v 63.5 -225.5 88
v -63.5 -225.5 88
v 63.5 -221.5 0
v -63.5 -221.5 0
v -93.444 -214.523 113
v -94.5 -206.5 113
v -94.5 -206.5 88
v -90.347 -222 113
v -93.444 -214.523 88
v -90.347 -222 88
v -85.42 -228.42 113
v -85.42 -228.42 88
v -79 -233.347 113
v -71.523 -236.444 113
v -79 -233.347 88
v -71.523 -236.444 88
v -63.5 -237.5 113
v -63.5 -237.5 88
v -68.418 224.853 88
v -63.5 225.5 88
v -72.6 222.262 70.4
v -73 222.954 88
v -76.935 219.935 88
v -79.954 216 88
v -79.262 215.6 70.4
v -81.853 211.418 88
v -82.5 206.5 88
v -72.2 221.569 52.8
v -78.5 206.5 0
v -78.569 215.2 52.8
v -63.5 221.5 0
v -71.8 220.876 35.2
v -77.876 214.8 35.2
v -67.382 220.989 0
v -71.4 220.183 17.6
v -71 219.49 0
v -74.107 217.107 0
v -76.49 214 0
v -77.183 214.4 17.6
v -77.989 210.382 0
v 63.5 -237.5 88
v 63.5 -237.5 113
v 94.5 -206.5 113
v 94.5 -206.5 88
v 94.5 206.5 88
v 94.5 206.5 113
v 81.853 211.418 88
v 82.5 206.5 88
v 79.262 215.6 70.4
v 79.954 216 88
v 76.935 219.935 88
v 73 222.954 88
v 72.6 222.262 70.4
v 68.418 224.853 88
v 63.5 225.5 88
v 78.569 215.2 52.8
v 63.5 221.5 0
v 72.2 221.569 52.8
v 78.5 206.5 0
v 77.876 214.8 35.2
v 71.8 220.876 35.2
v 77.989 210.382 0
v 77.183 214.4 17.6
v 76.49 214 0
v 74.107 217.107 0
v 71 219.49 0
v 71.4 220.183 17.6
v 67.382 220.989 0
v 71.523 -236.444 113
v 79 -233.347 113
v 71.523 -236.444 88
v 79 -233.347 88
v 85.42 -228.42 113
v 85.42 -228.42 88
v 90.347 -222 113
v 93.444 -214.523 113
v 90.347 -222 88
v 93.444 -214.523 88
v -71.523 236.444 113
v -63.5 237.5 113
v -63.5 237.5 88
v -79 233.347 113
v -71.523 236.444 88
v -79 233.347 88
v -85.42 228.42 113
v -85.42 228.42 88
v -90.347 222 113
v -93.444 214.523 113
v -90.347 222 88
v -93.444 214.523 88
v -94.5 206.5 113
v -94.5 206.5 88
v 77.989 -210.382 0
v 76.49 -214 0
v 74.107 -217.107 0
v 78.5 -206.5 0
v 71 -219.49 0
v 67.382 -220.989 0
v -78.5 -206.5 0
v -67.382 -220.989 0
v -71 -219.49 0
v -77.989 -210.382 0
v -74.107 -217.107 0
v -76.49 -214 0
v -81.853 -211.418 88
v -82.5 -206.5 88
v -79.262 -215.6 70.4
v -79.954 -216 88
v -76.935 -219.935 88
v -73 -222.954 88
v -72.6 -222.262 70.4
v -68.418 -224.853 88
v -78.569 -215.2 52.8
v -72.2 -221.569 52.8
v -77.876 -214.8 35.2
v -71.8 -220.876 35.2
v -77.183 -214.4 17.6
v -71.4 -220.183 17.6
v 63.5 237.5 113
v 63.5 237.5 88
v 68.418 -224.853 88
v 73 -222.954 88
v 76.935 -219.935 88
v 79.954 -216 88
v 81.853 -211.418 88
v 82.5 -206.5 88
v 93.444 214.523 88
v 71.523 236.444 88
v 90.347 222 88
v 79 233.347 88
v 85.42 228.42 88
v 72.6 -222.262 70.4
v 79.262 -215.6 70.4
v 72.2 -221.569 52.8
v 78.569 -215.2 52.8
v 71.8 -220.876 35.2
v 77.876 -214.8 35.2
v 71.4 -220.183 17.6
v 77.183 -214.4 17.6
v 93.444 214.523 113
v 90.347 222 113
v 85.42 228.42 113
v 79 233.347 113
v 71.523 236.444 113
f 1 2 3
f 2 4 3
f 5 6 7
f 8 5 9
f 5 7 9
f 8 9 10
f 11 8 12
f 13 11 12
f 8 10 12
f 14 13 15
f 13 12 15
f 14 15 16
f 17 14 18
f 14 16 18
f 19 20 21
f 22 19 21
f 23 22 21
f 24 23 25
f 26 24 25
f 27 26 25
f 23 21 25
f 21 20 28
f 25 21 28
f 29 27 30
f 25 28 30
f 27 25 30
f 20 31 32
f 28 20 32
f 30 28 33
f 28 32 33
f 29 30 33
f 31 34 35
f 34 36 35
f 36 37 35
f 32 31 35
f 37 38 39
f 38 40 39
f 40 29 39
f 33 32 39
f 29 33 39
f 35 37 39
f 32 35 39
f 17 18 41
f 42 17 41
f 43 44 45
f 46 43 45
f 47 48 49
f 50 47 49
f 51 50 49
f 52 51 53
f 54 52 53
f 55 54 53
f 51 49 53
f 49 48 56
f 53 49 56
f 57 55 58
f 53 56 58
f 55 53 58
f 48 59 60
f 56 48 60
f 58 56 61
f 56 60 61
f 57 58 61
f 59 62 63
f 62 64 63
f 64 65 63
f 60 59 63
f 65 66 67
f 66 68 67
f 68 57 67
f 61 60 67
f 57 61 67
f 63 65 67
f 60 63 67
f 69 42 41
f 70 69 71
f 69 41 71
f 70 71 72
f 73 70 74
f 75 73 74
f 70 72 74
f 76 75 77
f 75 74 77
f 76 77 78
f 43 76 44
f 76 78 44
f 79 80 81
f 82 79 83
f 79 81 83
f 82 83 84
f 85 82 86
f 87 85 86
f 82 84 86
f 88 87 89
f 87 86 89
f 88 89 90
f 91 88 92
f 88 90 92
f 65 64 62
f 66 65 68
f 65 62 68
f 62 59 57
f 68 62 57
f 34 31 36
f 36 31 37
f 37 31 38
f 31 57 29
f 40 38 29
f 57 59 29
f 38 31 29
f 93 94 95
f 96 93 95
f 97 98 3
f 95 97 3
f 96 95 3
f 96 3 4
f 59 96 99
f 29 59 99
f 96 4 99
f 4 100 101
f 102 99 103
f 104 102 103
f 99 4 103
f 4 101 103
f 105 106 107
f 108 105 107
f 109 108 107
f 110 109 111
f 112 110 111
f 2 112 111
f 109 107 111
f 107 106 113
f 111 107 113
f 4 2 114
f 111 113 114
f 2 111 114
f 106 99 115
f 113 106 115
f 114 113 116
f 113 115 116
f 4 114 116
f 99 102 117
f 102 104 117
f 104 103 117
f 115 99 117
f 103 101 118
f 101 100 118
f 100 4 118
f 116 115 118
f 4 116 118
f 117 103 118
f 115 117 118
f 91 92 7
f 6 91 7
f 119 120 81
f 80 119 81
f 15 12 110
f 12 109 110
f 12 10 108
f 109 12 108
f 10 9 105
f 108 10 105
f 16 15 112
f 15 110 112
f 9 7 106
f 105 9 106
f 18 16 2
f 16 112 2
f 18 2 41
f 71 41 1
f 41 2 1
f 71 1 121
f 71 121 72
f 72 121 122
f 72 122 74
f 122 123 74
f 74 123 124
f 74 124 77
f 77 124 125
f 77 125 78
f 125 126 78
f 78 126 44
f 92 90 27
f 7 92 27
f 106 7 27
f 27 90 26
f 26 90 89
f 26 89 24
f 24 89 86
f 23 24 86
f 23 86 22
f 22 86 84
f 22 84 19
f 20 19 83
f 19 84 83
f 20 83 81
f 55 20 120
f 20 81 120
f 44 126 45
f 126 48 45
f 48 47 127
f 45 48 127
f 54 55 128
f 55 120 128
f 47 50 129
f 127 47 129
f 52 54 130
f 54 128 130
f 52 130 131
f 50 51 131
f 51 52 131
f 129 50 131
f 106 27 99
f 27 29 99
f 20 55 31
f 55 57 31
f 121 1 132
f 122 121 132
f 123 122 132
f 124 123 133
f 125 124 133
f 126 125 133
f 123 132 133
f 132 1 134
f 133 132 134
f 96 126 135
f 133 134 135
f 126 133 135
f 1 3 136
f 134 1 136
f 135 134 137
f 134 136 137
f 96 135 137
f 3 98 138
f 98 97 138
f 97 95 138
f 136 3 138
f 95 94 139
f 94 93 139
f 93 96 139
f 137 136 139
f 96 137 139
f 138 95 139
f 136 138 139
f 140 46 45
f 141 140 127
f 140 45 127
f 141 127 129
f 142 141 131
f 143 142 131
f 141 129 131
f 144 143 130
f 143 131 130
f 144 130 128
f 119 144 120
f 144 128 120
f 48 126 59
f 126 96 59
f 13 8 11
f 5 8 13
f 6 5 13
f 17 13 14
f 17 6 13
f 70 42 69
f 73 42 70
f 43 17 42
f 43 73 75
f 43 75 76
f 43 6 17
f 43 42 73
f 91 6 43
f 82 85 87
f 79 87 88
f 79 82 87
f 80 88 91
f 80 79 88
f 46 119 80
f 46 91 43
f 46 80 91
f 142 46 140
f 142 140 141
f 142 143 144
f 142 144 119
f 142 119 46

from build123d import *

# Parameters (mm, degrees)
F5_DEPTH = 25


with BuildPart() as f3:
    # F2 (on offset) → F3 section 0
    with BuildSketch(Plane.XY.offset(88)):
        with BuildLine():
            Line((-82.5, 206.5), (-82.5, -206.5))
            ThreePointArc((-82.5, -206.5), (-76.9350288425, -219.9350288425), (-63.5, -225.5))
            Line((-63.5, -225.5), (63.5, -225.5))
            ThreePointArc((63.5, -225.5), (76.9350288425, -219.9350288425), (82.5, -206.5))
            Line((82.5, -206.5), (82.5, 206.5))
            ThreePointArc((82.5, 206.5), (76.9350288425, 219.9350288425), (63.5, 225.5))
            Line((63.5, 225.5), (-63.5, 225.5))
            ThreePointArc((-63.5, 225.5), (-76.9350288425, 219.9350288425), (-82.5, 206.5))
        make_face()
    # F0 (on Top) → F3 section 1
    with BuildSketch(Plane.XY):
        with BuildLine():
            ThreePointArc((78.5, 206.5), (74.1066017178, 217.1066017178), (63.5, 221.5))
            Line((63.5, 221.5), (-63.5, 221.5))
            ThreePointArc((-63.5, 221.5), (-74.1066017178, 217.1066017178), (-78.5, 206.5))
            Line((-78.5, 206.5), (-78.5, -206.5))
            ThreePointArc((-78.5, -206.5), (-74.1066017178, -217.1066017178), (-63.5, -221.5))
            Line((-63.5, -221.5), (63.5, -221.5))
            ThreePointArc((63.5, -221.5), (74.1066017178, -217.1066017178), (78.5, -206.5))
            Line((78.5, -206.5), (78.5, 206.5))
        make_face()
    loft()

    # F4 (on face) → F5 (join)
    with BuildSketch(Plane.XY.offset(88)):
        with BuildLine():
            Line((63.5, 237.5), (-63.5, 237.5))
            ThreePointArc((-63.5, 237.5), (-85.4203102168, 228.4203102168), (-94.5, 206.5))
            Line((-94.5, 206.5), (-94.5, -206.5))
            ThreePointArc((-94.5, -206.5), (-85.4203102168, -228.4203102168), (-63.5, -237.5))
            Line((-63.5, -237.5), (63.5, -237.5))
            ThreePointArc((63.5, -237.5), (85.4203102168, -228.4203102168), (94.5, -206.5))
            Line((94.5, -206.5), (94.5, 206.5))
            ThreePointArc((94.5, 206.5), (85.4203102168, 228.4203102168), (63.5, 237.5))
        make_face()
    extrude(amount=F5_DEPTH)


solid = f3.part
